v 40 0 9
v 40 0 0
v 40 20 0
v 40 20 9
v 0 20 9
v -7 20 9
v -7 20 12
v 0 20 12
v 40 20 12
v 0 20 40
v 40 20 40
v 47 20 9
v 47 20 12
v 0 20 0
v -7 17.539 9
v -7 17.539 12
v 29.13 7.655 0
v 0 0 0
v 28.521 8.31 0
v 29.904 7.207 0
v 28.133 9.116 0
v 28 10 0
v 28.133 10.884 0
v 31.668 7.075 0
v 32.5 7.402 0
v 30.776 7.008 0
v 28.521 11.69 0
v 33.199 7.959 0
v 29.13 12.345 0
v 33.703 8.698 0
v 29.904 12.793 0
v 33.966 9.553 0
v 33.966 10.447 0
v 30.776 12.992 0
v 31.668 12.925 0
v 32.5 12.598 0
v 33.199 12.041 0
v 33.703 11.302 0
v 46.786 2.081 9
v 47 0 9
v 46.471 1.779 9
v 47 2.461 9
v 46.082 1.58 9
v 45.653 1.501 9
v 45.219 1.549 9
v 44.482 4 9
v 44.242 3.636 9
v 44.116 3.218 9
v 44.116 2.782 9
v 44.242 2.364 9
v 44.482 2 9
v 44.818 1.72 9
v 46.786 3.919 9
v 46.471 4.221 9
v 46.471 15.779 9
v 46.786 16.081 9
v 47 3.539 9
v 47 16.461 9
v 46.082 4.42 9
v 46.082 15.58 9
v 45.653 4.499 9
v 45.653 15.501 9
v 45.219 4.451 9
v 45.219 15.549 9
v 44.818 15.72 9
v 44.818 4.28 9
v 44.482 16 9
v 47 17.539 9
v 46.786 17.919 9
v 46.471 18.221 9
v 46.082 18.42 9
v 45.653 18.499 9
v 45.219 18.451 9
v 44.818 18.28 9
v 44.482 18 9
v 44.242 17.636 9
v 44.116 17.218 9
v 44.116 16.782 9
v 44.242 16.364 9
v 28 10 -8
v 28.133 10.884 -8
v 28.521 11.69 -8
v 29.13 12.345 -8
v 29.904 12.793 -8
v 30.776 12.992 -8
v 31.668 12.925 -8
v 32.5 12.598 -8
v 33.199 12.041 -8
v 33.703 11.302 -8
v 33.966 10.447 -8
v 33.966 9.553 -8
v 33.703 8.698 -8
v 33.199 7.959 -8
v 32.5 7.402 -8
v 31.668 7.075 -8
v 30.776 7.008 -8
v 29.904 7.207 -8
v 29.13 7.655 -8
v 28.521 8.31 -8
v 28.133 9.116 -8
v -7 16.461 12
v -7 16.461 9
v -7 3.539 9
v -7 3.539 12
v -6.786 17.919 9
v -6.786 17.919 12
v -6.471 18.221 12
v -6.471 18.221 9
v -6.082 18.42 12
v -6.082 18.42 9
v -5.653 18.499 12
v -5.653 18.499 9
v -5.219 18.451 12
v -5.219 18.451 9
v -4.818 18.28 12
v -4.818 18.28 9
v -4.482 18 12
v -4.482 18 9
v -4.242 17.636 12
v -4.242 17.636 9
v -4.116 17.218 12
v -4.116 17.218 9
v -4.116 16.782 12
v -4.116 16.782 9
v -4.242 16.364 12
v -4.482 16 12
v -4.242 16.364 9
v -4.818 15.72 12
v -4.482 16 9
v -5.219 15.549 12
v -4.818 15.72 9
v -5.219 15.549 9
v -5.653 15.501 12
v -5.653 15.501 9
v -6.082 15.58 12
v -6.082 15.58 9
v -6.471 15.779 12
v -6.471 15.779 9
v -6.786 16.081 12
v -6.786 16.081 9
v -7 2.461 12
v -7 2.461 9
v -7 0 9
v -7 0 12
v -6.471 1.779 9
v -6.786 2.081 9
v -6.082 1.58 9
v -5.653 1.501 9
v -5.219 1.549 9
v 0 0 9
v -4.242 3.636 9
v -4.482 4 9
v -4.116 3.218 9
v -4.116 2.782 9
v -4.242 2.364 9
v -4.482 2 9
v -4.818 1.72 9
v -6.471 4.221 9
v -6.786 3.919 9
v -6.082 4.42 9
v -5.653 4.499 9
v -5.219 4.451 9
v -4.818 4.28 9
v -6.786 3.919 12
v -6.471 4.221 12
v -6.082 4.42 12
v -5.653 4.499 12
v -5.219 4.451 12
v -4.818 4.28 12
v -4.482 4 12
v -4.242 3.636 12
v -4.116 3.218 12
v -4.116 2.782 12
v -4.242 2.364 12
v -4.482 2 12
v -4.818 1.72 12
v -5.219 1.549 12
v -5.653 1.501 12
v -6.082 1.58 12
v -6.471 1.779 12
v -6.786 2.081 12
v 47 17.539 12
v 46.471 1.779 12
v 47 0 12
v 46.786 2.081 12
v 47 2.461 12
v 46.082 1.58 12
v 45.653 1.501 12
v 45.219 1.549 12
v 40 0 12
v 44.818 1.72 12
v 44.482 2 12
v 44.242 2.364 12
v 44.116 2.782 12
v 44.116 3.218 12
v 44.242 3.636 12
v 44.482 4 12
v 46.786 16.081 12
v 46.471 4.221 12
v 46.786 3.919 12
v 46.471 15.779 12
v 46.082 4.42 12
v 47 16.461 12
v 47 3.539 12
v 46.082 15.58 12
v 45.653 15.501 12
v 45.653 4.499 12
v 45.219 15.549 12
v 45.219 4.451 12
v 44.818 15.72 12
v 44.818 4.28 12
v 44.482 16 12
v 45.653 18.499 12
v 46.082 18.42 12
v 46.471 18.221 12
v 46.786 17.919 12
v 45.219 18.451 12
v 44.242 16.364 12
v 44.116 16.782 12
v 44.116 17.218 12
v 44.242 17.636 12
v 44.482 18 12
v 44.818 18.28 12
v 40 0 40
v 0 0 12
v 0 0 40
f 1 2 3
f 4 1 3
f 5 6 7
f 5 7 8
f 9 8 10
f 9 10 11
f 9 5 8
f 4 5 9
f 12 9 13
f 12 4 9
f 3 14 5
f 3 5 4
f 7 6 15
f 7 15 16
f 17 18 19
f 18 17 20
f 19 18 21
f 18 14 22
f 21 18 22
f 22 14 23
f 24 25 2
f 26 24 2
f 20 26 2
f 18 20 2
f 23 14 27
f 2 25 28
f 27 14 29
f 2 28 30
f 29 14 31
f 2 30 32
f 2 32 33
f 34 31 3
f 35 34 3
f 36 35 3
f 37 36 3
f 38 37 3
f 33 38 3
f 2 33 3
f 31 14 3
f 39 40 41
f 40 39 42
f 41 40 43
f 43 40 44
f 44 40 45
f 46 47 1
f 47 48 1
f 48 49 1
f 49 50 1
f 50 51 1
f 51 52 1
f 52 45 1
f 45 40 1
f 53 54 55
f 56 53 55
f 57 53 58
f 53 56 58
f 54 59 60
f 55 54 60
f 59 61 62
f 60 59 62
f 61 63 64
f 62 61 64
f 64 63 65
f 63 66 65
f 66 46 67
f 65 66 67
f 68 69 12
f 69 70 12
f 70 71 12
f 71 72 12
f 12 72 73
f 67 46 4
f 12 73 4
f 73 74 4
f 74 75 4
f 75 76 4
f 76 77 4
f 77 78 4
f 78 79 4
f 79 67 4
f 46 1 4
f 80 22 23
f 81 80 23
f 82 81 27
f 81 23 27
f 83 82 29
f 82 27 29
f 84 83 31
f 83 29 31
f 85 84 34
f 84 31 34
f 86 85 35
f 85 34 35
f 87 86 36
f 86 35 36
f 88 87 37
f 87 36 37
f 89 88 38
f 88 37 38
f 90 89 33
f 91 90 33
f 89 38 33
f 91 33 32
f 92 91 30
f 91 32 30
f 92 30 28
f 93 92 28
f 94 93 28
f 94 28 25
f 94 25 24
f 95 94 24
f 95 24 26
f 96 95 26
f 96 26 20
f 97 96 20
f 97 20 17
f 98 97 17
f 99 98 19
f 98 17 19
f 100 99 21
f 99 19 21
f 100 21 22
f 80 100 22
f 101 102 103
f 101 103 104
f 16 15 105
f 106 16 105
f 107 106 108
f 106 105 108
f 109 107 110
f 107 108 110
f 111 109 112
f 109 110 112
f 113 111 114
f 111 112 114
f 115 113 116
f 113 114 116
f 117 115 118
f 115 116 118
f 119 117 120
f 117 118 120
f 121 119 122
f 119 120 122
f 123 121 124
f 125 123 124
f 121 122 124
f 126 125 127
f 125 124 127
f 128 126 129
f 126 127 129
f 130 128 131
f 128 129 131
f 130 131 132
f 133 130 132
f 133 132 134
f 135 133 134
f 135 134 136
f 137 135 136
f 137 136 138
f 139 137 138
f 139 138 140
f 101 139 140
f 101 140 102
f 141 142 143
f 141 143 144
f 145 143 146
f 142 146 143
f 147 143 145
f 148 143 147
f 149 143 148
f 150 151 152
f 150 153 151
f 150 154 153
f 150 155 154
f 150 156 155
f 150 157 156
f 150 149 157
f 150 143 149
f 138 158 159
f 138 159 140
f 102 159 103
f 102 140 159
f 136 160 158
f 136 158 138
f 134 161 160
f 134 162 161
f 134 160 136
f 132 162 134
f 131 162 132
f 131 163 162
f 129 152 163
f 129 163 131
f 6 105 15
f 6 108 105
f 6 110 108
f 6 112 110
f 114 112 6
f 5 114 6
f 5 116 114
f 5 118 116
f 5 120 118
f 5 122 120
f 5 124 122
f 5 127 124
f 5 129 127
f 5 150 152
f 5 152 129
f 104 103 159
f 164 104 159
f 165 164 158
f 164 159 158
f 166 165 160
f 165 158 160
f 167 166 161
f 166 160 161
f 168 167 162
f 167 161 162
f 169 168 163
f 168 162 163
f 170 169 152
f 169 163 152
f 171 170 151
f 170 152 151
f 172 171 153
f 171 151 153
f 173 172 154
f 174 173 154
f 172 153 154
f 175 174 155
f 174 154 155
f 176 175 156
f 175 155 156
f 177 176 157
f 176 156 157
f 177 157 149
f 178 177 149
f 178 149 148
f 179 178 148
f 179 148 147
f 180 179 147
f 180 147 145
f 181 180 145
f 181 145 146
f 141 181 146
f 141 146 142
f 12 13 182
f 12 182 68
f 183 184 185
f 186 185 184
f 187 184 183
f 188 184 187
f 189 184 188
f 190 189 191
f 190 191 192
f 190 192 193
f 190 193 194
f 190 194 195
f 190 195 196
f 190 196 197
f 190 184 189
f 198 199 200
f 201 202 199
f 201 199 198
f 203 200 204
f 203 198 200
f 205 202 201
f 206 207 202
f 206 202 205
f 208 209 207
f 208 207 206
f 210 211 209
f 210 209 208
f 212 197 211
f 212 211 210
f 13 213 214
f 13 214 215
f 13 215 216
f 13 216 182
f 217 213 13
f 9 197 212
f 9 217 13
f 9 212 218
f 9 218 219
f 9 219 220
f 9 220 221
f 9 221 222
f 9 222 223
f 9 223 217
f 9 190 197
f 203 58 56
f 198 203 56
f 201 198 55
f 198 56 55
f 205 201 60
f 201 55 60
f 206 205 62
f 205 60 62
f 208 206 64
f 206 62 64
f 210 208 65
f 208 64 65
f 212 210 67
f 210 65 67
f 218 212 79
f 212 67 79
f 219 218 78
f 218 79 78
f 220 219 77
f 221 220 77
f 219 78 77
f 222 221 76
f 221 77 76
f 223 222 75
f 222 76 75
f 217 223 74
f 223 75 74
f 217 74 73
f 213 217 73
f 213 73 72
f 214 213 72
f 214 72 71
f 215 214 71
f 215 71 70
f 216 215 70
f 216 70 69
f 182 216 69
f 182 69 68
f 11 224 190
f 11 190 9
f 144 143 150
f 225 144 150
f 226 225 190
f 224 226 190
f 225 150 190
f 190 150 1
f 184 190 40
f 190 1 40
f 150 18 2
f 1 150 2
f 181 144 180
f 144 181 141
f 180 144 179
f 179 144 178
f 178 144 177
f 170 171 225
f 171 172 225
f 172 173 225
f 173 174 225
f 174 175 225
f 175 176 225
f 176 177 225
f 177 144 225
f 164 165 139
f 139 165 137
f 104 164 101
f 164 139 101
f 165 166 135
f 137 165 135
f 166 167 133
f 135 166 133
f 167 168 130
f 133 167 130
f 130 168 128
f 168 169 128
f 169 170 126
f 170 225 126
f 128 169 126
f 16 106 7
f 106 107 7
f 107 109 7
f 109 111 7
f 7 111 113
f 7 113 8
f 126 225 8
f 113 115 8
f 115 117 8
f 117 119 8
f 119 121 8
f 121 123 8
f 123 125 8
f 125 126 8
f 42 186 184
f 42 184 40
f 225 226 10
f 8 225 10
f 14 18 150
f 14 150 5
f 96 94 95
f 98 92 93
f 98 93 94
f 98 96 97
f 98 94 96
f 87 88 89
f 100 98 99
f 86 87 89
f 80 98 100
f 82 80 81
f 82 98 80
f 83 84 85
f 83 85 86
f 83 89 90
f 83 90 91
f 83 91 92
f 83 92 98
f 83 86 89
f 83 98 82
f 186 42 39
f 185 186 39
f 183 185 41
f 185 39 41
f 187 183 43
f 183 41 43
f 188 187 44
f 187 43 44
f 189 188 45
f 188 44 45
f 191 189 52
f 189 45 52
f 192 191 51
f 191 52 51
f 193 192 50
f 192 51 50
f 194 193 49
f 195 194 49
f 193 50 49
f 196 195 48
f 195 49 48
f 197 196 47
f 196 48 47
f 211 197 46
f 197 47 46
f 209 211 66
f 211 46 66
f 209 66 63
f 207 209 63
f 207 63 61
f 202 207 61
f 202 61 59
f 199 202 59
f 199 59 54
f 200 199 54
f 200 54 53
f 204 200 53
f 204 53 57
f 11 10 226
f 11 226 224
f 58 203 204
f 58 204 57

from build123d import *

# Parameters (mm, degrees)
ESQUISSE1_W             = 40
ESQUISSE1_H             = 20
BOSS_EXTRU_1_DEPTH      = 40
ESQUISSE3_W             = 3
ESQUISSE3_H             = 20
BOSS_EXTRU_2_DEPTH      = 7
ESQUISSE4_W             = 3
ESQUISSE4_H             = 20
BOSS_EXTRU_3_DEPTH      = 7
ESQUISSE5_R             = 1.5
ENL_V_MAT_EXTRU_3_DEPTH = 7
ESQUISSE6_R             = 3
BOSS_EXTRU_4_DEPTH      = 8


with BuildPart() as part:
    # Esquisse1 → Boss.-Extru.1 (new body)
    with BuildSketch(Plane.XY):
        with Locations((20, 10)):
            Rectangle(ESQUISSE1_W, ESQUISSE1_H)
    extrude(amount=BOSS_EXTRU_1_DEPTH)

    # Esquisse3 → Boss.-Extru.2 (add)
    with BuildSketch(Plane(origin=(40, 0, 0), x_dir=(0, 0, -1), z_dir=(1, 0, 0))):
        with Locations((-10.5, 10)):
            Rectangle(ESQUISSE3_W, ESQUISSE3_H)
    extrude(amount=BOSS_EXTRU_2_DEPTH)

    # Esquisse4 → Boss.-Extru.3 (add)
    with BuildSketch(Plane.ZY):
        with Locations((10.5, 10)):
            Rectangle(ESQUISSE4_W, ESQUISSE4_H)
    extrude(amount=BOSS_EXTRU_3_DEPTH)

    # Esquisse5 → Enlèv. mat.-Extru.3 (cut)
    with BuildSketch(Plane(origin=(0, 0, 9), x_dir=(-1, 0, 0), z_dir=(0, 0, -1))):
        with Locations((-45.6, 17)):
            Circle(ESQUISSE5_R)
        with Locations((-45.6, 3)):
            Circle(ESQUISSE5_R)
        with Locations((5.6, 17)):
            Circle(ESQUISSE5_R)
        with Locations((5.6, 3)):
            Circle(ESQUISSE5_R)
    extrude(amount=-ENL_V_MAT_EXTRU_3_DEPTH, mode=Mode.SUBTRACT)

    # Esquisse6 → Boss.-Extru.4 (add)
    with BuildSketch(Plane(origin=(0, 0, 0), x_dir=(-1, 0, 0), z_dir=(0, 0, -1))):
        with Locations((-31, 10)):
            Circle(ESQUISSE6_R)
    extrude(amount=BOSS_EXTRU_4_DEPTH)


solid = part.part
